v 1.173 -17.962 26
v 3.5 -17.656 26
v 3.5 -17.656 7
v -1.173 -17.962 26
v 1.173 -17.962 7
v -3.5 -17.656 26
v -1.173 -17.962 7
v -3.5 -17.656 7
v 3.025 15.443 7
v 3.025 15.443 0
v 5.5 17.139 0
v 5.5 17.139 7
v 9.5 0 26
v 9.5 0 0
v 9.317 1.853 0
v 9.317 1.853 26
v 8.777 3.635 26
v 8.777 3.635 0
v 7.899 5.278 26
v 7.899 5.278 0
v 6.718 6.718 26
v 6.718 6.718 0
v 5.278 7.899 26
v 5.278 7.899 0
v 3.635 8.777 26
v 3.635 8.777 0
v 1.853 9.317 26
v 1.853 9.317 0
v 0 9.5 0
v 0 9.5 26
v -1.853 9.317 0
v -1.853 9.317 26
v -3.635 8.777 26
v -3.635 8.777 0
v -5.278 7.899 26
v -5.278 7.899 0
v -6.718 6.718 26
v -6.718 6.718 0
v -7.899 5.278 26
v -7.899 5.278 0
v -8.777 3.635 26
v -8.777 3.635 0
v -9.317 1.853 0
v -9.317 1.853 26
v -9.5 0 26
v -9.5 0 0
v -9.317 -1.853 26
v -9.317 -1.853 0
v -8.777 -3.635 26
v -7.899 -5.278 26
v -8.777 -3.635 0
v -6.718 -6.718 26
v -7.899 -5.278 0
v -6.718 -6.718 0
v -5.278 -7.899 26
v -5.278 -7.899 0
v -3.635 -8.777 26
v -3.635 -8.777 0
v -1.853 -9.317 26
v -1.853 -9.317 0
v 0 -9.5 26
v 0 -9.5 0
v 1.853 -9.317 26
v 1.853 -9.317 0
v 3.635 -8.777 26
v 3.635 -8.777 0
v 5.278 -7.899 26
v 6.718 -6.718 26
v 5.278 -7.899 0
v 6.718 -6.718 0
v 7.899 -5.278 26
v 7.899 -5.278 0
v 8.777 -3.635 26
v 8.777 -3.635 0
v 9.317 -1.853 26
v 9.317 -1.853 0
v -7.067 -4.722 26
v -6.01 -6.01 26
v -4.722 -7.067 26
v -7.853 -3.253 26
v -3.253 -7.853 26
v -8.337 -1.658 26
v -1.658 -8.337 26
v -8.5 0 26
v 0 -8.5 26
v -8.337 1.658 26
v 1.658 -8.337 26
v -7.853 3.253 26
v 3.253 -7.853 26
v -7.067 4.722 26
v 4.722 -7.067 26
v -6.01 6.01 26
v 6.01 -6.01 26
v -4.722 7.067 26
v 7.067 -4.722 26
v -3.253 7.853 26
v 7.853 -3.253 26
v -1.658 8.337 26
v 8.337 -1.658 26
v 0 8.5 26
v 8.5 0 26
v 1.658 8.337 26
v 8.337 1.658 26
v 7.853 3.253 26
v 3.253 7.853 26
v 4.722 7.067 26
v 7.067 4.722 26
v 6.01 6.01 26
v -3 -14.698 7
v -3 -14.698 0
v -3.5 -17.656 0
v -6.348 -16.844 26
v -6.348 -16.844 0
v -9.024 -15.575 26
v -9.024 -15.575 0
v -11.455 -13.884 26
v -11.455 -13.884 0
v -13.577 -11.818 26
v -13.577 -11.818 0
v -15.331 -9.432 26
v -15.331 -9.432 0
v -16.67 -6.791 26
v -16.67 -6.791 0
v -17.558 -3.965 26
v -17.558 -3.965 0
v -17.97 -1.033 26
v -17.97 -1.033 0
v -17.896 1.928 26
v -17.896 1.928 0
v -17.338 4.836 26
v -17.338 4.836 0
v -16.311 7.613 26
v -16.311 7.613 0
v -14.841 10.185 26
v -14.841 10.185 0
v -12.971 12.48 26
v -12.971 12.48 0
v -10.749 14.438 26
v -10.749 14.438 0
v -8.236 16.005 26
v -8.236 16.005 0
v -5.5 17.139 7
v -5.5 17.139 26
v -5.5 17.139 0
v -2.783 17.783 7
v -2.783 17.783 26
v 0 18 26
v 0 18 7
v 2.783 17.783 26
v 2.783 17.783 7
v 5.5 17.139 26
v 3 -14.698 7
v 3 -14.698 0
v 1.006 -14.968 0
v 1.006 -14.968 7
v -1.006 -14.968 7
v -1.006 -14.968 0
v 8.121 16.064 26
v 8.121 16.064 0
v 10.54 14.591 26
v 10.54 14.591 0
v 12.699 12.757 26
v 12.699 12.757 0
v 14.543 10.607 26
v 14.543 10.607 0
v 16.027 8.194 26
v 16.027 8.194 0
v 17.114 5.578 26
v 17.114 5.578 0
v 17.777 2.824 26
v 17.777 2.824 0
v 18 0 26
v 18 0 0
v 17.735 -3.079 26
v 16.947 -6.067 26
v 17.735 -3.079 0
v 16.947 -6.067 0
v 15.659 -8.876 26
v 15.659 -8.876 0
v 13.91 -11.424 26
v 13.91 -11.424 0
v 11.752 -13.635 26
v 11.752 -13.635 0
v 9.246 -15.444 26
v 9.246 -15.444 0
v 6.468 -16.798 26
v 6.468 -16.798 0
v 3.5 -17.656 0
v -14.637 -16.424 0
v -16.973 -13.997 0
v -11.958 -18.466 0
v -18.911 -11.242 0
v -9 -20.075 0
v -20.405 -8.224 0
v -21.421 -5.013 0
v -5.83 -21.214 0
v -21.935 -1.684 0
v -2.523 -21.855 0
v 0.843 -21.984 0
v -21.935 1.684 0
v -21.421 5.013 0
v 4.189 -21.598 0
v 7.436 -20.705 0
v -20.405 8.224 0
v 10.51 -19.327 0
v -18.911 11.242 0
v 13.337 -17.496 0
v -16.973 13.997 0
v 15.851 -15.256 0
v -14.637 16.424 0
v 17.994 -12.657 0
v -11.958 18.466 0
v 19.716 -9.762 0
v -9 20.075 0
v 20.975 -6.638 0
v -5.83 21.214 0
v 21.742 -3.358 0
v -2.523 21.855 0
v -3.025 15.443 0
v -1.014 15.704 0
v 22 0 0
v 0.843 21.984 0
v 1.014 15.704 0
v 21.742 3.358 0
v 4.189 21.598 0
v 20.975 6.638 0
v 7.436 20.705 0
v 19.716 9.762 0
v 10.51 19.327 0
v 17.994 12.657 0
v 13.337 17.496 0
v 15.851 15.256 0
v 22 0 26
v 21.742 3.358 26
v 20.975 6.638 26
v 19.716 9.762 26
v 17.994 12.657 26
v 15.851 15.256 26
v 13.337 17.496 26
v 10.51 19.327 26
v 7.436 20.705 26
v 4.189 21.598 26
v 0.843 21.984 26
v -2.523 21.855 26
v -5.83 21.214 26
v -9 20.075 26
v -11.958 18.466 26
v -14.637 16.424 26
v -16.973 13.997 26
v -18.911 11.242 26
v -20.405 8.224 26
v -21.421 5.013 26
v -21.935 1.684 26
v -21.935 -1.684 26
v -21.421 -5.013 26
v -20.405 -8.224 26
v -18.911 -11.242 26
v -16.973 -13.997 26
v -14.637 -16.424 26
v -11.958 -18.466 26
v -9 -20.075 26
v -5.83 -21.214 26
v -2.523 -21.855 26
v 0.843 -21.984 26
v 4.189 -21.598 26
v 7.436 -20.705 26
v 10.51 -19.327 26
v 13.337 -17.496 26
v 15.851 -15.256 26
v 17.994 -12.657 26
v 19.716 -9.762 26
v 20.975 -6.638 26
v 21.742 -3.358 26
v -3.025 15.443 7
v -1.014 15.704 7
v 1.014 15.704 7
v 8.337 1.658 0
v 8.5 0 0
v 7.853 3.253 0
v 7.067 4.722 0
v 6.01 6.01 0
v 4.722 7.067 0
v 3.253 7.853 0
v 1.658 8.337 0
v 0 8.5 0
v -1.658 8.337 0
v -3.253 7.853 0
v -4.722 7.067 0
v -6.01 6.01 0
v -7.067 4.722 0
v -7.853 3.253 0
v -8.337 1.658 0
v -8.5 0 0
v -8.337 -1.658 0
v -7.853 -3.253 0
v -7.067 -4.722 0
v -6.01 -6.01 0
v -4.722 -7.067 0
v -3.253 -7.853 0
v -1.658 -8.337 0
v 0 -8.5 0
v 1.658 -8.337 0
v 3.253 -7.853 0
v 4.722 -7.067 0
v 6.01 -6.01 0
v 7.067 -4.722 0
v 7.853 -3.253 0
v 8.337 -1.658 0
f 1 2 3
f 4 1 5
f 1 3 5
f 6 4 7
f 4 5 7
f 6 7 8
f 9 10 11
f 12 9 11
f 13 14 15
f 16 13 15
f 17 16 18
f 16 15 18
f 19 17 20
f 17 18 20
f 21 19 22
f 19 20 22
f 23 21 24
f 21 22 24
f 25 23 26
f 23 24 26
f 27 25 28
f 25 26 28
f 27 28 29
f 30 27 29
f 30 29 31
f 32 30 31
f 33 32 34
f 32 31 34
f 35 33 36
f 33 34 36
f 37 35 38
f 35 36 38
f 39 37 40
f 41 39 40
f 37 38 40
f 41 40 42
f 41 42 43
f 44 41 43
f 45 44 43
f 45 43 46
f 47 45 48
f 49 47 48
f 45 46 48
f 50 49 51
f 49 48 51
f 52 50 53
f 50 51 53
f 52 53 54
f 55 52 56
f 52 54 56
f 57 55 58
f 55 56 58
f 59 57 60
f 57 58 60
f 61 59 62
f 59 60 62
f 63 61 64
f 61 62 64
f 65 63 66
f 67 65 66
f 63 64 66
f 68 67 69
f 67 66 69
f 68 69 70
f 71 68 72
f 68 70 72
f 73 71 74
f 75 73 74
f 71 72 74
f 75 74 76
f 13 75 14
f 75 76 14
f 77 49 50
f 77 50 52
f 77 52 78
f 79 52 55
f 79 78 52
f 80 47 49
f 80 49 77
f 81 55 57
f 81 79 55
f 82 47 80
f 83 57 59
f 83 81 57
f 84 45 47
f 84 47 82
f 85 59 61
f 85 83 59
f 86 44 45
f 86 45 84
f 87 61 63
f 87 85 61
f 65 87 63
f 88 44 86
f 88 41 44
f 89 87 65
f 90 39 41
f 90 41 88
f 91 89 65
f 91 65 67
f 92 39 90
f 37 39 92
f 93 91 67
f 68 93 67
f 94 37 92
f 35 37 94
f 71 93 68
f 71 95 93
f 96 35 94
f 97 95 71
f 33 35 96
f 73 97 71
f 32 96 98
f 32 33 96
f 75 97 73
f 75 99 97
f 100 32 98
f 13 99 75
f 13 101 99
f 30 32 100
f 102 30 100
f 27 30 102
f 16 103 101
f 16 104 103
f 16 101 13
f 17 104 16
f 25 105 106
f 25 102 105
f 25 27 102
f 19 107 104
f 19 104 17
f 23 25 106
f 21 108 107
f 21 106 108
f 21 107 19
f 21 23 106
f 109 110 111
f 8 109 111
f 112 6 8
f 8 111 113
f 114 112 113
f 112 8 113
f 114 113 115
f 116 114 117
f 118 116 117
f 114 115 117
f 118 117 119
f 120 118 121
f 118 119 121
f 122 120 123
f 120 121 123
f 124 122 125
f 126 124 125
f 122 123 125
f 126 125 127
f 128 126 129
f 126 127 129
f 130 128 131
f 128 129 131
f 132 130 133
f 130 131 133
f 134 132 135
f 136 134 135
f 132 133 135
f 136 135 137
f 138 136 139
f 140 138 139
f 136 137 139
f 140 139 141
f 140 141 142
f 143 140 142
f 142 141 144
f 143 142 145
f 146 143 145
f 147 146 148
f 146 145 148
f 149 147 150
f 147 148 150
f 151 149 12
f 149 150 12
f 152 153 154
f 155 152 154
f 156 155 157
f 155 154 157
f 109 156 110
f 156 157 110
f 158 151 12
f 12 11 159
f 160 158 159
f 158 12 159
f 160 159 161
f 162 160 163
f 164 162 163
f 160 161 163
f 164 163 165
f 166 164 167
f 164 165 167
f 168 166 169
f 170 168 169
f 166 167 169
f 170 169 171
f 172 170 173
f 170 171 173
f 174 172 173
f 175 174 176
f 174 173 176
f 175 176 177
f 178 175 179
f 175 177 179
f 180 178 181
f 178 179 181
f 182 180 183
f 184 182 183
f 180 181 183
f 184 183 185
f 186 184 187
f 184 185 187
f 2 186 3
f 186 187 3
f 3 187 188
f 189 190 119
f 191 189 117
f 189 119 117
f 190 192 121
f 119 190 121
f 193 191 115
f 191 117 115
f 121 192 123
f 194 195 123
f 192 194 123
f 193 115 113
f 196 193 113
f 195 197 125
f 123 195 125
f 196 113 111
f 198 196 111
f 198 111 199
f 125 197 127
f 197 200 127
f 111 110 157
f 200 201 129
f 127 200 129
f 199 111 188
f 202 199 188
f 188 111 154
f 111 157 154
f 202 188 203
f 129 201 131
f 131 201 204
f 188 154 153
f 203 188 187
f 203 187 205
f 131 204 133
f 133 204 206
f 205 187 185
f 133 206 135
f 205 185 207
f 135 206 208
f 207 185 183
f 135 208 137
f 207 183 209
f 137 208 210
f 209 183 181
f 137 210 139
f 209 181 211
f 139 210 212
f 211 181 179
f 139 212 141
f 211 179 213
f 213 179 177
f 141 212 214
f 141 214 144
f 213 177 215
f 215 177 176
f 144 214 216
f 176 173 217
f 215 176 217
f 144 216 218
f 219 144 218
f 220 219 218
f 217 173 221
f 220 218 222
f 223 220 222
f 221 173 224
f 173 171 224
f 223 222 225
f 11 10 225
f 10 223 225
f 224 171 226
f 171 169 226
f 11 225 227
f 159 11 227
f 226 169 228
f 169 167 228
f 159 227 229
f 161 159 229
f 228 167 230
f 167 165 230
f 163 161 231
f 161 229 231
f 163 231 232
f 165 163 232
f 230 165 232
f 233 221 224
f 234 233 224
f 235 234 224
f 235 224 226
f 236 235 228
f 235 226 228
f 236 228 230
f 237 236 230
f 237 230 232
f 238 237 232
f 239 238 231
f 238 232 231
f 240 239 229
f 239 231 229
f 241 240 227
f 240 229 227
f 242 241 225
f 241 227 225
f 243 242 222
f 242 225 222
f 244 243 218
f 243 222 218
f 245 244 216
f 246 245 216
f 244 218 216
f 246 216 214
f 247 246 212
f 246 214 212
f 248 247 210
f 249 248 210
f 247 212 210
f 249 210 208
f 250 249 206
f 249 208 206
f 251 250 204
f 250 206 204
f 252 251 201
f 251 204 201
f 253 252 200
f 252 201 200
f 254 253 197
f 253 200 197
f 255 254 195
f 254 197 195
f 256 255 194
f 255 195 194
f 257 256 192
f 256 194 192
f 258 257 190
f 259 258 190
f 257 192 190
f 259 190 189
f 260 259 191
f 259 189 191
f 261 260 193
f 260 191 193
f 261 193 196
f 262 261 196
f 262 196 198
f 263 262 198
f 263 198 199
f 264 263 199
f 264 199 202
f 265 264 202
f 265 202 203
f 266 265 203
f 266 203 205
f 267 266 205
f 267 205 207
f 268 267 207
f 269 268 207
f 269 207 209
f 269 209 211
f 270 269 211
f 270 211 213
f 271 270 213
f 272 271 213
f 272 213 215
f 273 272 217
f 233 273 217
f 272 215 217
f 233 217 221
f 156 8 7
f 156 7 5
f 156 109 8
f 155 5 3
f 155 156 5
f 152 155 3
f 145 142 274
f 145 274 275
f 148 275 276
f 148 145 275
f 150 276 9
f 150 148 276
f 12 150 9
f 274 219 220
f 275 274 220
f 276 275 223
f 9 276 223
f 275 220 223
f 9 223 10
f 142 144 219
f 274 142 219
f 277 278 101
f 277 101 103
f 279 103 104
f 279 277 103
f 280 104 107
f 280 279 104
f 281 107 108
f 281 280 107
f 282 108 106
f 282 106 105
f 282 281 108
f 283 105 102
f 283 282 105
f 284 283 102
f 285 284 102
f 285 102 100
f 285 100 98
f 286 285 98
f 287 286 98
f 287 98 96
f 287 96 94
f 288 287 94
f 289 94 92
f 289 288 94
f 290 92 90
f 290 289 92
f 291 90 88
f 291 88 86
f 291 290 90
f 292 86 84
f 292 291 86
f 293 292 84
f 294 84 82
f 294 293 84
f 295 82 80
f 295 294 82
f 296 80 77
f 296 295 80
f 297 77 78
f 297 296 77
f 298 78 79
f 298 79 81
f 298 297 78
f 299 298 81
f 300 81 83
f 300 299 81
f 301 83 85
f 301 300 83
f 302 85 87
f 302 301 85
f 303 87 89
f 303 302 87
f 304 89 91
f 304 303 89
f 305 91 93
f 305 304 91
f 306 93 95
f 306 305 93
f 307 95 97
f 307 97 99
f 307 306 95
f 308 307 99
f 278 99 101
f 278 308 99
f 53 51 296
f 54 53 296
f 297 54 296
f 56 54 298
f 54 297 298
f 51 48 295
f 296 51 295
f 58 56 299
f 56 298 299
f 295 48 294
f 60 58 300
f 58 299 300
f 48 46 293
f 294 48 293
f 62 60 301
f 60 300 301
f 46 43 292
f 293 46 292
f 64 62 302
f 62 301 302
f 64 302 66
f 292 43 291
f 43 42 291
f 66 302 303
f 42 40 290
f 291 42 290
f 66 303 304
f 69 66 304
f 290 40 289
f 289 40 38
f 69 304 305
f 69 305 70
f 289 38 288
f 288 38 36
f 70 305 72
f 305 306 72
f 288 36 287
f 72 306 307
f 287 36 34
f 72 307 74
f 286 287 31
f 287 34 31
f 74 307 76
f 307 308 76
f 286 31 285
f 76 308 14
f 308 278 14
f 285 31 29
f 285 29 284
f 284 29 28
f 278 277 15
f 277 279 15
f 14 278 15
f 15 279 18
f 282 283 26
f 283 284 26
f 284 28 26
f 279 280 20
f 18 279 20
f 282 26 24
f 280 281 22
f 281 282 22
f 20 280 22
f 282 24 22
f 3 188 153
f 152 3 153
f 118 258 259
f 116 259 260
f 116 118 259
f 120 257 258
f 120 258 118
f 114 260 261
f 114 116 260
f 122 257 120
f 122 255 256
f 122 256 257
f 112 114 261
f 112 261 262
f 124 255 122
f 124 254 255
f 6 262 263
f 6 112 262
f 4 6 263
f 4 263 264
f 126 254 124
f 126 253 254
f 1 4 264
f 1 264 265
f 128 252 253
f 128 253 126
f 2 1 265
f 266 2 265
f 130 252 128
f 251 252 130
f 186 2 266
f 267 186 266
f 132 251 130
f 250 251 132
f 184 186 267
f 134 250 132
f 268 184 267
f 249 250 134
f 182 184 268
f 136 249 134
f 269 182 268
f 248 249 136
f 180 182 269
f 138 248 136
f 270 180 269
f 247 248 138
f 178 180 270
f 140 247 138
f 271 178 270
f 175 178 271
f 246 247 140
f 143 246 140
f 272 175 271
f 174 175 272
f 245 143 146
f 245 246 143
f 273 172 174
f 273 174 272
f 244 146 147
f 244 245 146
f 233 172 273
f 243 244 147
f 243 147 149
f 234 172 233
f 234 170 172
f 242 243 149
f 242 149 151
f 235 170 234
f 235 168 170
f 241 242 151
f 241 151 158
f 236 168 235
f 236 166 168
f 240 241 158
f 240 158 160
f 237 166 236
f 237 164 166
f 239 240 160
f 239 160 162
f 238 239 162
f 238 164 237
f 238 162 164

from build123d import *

# Parameters (mm, degrees)
F0_R     = 22
F0_R_2   = 9.5
F0_R_3   = 8.5
F1_DEPTH = 26
F2_DEPTH = 7


with BuildPart() as f1:
    # F0 (on Top) → F1 (new body)
    with BuildSketch(Plane.XY):
        Circle(F0_R)
        with BuildLine():
            ThreePointArc((5.5, 17.139137), (14.54304, 10.606602), (18, 0))
            ThreePointArc((18, 0), (13.910428, -11.42366), (3.5, -17.656444))
            ThreePointArc((3.5, -17.656444), (0, -18), (-3.5, -17.656444))
            ThreePointArc((-3.5, -17.656444), (-17.970339, -1.032909), (-5.5, 17.139137))
            ThreePointArc((-5.5, 17.139137), (0, 18), (5.5, 17.139137))
        make_face(mode=Mode.SUBTRACT)
        Circle(F0_R_2)
        Circle(F0_R_3, mode=Mode.SUBTRACT)
    extrude(amount=F1_DEPTH)

    # F0 (on Top) → F2 (join)
    with BuildSketch(Plane.XY):
        with BuildLine():
            Line((3.025386, 15.443175), (5.5, 17.139137))
            ThreePointArc((5.5, 17.139137), (0, 18), (-5.5, 17.139137))
            Line((-5.5, 17.139137), (-3.025386, 15.443175))
            ThreePointArc((-3.025386, 15.443175), (0, 15.736728), (3.025386, 15.443175))
        make_face()
        with BuildLine():
            ThreePointArc((-3.5, -17.656444), (0, -18), (3.5, -17.656444))
            Line((3.5, -17.656444), (3, -14.698404))
            ThreePointArc((3, -14.698404), (0, -15.001436), (-3, -14.698404))
            Line((-3, -14.698404), (-3.5, -17.656444))
        make_face()
    extrude(amount=F2_DEPTH)


solid = f1.part
